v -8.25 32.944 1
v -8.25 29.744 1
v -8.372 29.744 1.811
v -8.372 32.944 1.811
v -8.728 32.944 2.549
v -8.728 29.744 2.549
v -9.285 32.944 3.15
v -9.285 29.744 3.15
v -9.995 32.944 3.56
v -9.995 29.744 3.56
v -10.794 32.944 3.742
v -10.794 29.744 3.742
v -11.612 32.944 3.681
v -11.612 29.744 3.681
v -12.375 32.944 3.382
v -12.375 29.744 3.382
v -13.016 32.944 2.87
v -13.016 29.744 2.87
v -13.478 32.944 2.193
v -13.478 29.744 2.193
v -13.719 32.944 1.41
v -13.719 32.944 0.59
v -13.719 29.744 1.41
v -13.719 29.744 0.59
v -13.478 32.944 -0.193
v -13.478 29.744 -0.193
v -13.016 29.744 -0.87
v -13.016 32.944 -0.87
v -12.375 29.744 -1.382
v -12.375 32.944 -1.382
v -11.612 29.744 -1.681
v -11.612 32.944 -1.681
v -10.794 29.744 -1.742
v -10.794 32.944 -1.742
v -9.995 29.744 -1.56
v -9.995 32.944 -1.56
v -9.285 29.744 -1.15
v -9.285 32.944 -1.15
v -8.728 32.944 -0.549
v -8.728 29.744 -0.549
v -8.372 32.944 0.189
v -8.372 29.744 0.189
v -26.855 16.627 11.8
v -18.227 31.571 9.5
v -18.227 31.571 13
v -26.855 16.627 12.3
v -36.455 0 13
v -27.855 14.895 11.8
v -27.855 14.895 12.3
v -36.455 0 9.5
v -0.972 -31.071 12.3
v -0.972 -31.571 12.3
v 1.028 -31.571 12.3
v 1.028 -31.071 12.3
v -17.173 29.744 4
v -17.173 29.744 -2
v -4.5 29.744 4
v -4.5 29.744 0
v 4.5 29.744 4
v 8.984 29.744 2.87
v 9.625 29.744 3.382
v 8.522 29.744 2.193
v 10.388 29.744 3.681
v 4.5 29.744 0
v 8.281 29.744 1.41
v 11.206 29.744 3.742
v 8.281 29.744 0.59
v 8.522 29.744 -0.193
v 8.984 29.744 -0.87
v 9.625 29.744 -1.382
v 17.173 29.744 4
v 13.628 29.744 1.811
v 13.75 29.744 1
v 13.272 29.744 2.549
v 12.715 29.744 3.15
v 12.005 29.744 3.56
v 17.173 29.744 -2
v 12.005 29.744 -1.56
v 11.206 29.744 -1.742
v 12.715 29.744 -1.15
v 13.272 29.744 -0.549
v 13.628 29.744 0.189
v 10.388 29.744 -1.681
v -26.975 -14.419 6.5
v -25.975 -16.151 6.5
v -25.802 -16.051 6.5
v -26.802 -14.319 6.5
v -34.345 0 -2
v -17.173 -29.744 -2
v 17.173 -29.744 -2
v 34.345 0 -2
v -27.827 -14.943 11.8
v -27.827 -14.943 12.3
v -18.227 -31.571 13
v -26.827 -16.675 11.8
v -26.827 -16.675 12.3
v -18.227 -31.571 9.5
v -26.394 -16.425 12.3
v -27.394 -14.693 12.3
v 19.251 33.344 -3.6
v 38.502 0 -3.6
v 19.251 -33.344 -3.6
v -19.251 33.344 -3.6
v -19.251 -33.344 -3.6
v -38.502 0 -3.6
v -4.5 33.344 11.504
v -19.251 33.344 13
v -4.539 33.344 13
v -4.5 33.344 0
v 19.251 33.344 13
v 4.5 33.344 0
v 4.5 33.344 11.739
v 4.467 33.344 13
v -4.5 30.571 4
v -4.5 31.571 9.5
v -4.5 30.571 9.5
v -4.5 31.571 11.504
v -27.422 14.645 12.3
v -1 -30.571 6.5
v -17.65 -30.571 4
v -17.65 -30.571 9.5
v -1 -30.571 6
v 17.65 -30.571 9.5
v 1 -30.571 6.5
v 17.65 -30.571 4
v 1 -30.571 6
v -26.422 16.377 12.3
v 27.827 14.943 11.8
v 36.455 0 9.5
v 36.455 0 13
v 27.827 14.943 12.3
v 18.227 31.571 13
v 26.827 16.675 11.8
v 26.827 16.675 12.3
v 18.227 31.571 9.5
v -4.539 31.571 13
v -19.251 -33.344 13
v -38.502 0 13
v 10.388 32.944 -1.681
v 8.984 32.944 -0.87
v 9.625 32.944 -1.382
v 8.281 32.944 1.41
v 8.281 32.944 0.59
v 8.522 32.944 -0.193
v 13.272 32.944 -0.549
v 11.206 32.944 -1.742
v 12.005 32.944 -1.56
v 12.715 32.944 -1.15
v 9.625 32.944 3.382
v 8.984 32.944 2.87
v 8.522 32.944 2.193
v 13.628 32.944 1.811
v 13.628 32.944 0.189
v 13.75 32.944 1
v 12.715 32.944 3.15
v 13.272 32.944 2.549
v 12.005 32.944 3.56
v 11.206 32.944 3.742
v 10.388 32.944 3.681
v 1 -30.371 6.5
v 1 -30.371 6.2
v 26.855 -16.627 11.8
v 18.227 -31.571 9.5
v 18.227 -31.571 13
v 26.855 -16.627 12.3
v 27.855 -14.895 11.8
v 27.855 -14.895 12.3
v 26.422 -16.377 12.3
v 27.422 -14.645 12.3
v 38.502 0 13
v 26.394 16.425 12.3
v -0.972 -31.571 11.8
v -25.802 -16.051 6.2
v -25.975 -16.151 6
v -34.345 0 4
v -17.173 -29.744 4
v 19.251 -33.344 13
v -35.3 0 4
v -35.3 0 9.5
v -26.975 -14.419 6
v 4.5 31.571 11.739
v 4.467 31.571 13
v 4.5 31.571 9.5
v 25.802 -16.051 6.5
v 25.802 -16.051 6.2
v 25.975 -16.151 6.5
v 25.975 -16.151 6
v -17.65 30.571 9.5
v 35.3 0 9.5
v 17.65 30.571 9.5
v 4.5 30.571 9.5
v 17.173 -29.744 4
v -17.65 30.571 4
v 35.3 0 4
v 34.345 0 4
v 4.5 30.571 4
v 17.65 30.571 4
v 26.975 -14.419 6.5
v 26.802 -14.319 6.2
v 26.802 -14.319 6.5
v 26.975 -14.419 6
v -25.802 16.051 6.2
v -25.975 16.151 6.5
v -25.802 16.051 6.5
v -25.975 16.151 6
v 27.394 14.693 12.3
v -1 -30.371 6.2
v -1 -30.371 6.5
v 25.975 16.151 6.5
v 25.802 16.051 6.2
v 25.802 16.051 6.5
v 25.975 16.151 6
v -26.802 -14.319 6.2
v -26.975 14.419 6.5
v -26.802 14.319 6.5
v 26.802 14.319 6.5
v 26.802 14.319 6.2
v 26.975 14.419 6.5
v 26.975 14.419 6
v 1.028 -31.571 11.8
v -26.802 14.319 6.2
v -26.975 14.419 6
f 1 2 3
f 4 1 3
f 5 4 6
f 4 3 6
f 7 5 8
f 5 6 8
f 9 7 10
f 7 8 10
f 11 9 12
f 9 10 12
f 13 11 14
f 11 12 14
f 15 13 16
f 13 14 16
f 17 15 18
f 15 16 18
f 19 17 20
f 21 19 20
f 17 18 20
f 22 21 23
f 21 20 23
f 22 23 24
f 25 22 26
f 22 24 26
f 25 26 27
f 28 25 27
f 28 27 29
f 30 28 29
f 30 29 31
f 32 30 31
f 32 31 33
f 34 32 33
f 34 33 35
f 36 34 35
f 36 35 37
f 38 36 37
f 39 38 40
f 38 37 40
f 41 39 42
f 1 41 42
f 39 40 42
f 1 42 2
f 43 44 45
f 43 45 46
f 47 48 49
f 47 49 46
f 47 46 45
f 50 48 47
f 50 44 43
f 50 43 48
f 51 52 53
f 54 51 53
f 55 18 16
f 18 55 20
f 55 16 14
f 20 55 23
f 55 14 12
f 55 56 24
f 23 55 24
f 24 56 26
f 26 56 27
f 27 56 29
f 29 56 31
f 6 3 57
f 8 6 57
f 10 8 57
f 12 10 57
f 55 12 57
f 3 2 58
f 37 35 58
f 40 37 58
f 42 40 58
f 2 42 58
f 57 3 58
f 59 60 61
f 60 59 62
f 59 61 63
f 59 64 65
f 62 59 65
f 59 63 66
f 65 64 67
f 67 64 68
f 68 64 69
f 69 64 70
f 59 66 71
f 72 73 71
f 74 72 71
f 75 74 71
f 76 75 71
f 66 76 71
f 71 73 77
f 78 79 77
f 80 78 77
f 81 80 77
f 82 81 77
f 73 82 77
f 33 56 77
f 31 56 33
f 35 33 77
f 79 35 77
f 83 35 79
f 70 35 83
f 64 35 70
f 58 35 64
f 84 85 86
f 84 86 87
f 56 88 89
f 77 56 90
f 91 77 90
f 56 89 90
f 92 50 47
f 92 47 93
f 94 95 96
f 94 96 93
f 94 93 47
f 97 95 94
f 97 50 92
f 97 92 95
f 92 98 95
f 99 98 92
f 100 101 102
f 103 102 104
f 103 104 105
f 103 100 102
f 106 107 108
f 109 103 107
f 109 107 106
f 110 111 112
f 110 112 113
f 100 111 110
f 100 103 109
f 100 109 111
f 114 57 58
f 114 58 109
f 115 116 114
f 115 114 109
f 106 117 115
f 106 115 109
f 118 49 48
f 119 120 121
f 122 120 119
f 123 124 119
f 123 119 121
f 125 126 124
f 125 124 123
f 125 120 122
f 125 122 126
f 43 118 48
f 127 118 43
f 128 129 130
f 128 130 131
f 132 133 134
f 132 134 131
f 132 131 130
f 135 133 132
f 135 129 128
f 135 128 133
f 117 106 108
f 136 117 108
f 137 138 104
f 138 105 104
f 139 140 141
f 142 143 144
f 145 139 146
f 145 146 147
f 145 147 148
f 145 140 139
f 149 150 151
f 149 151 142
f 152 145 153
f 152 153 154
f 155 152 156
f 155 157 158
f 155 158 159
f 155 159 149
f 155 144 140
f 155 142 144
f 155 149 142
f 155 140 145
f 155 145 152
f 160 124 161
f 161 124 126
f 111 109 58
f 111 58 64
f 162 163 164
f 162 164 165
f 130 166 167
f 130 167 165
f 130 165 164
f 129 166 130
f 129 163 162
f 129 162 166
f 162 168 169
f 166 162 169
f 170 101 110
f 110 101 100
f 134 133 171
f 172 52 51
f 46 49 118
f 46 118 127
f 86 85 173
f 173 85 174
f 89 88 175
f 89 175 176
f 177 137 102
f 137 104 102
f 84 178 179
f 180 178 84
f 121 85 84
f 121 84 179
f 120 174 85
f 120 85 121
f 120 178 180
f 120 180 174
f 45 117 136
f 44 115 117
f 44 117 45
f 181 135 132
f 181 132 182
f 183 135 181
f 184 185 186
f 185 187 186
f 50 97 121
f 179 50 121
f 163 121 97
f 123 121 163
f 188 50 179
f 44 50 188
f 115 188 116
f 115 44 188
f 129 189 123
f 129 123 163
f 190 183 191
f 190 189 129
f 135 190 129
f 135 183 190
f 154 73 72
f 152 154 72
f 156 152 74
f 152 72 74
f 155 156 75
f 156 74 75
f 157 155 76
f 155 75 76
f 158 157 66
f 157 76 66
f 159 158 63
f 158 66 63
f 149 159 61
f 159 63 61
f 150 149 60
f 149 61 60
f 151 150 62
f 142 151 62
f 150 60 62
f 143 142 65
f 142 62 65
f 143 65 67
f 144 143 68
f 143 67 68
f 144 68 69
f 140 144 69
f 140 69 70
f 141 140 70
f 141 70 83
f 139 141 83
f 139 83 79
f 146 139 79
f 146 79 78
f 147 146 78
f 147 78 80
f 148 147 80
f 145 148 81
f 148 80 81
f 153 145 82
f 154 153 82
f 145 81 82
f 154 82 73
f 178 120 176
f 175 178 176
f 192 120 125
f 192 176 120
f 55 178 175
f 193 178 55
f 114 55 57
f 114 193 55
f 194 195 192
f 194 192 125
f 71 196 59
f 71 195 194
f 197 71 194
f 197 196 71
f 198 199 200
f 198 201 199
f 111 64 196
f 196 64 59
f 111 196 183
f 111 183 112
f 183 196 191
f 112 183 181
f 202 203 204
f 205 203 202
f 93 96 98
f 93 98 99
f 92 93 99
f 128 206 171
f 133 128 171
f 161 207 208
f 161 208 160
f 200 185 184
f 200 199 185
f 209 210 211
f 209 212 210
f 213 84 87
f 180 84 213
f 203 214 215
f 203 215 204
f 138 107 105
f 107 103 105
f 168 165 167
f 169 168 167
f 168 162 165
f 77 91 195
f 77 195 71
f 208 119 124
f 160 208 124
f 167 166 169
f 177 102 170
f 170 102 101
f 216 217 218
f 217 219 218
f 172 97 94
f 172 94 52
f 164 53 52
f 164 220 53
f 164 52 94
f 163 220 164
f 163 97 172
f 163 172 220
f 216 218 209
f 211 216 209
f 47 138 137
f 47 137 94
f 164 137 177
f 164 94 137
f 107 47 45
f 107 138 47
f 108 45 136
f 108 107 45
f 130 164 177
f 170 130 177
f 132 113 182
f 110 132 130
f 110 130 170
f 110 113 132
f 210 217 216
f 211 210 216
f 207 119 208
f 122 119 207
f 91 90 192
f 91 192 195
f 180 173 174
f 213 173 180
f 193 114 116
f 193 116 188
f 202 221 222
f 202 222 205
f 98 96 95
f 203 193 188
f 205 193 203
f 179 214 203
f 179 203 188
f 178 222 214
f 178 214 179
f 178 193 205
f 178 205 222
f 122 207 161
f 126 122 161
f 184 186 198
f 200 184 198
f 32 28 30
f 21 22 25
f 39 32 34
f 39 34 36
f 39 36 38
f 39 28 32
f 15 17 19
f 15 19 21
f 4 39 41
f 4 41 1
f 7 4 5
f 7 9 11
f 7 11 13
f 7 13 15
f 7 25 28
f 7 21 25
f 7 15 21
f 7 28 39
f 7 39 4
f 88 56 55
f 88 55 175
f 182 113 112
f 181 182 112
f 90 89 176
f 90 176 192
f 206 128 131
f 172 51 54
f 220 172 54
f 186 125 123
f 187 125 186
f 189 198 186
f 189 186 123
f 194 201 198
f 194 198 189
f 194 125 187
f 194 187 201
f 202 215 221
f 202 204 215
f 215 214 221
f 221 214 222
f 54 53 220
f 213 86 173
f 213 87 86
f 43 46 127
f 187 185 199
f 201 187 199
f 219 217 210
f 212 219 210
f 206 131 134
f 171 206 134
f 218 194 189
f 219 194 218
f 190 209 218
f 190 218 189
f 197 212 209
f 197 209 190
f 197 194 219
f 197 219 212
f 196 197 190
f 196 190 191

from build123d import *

# Parameters (mm, degrees)
BOSS_EXTRUDE1_DEPTH  = 10
BOSS_EXTRUDE2_DEPTH  = 1.6
BOSS_EXTRUDE5_DEPTH  = 1.6
BOSS_EXTRUDE6_DEPTH  = 2
SKETCH10_W           = 9
SKETCH10_H           = 8
CUT_EXTRUDE1_DEPTH   = 2
BOSS_EXTRUDE7_DEPTH  = 8
CUT_EXTRUDE2_DEPTH   = 4
SKETCH13_W           = 9
SKETCH13_H           = 4
CUT_EXTRUDE3_DEPTH   = 4
SKETCH16_W           = 9
SKETCH16_H           = 2
CUT_EXTRUDE4_DEPTH   = 3
BOSS_EXTRUDE10_DEPTH = 7.6
SKETCH21_W           = 9
SKETCH21_H           = 1
CUT_EXTRUDE5_DEPTH   = 6
CUT_EXTRUDE7_DEPTH   = 2.2
BOSS_EXTRUDE11_DEPTH = 2
CUT_EXTRUDE8_DEPTH   = 2
BOSS_EXTRUDE12_DEPTH = 2
BOSS_EXTRUDE13_DEPTH = 5.7
BOSS_EXTRUDE14_DEPTH = 5
CUT_EXTRUDE9_DEPTH   = 76.043267682
SKETCH30_W           = 2
SKETCH30_H           = 0.5
BOSS_EXTRUDE15_DEPTH = 0.2
CHAMFER1_SIZE        = 0.2
SKETCH31_W           = 0.5
SKETCH31_H           = 2
BOSS_EXTRUDE16_DEPTH = 0.2
CHAMFER2_SIZE        = 0.2
SKETCH32_W           = 0.5
SKETCH32_H           = 2
BOSS_EXTRUDE17_DEPTH = 0.2
CHAMFER3_SIZE        = 0.2
SKETCH33_W           = 0.5
SKETCH33_H           = 2
BOSS_EXTRUDE18_DEPTH = 0.2
CHAMFER4_SIZE        = 0.2
BOSS_EXTRUDE25_DEPTH = 2
SKETCH34_W           = 0.5
SKETCH34_H           = 2
BOSS_EXTRUDE19_DEPTH = 0.2
CHAMFER5_SIZE        = 0.2
SKETCH41_W           = 9
SKETCH41_H           = 6
CUT_EXTRUDE10_DEPTH  = 2
SKETCH42_R           = 2.75
CUT_EXTRUDE11_DEPTH  = 3.2
SKETCH50_W           = 0.5
SKETCH50_H           = 2
BOSS_EXTRUDE27_DEPTH = 0.5
SKETCH49_W           = 0.5
SKETCH49_H           = 2
BOSS_EXTRUDE28_DEPTH = 0.5
SKETCH44_W           = 2
SKETCH44_H           = 0.5
BOSS_EXTRUDE29_DEPTH = 0.5
SKETCH45_W           = 0.5
SKETCH45_H           = 2
BOSS_EXTRUDE30_DEPTH = 0.5
SKETCH47_W           = 0.5
SKETCH47_H           = 2
BOSS_EXTRUDE31_DEPTH = 0.5
CHAMFER6_SIZE        = 0.5
CHAMFER7_SIZE        = 0.5
CHAMFER8_SIZE        = 0.5
CHAMFER9_SIZE        = 0.5
CHAMFER10_SIZE       = 0.5
CUT_EXTRUDE12_DEPTH  = 30
SKETCH53_W           = 9
SKETCH53_H           = 2
BOSS_EXTRUDE32_DEPTH = 3.6


with BuildPart() as part:
    # Sketch1 → Boss-Extrude1 (new body)
    with BuildSketch(Plane.XY):
        Polygon((37.347520861, 0), (18.673760431, 32.343901834), (-18.673760431, 32.343901834), (-37.347520861, 0), (-18.673760431, -32.343901834), (18.673760431, -32.343901834), align=None)
        Polygon((35.5, 0), (17.75, 30.743901834), (-17.75, 30.743901834), (-35.5, 0), (-17.75, -30.743901834), (17.75, -30.743901834), align=None, mode=Mode.SUBTRACT)
    extrude(amount=BOSS_EXTRUDE1_DEPTH)

    # Sketch2 → Boss-Extrude2 (add)
    with BuildSketch(Plane(origin=(0, 0, 0), x_dir=(-1, 0, 0), z_dir=(0, 0, -1))):
        Polygon((36.847520861, 0), (18.423760431, 31.910889132), (-18.423760431, 31.910889132), (-36.847520861, 0), (-18.423760431, -31.910889132), (18.423760431, -31.910889132), align=None)
    extrude(amount=BOSS_EXTRUDE2_DEPTH)

    # Sketch8 → Boss-Extrude5 (add)
    with BuildSketch(Plane(origin=(0, 0, 0), x_dir=(-1, 0, 0), z_dir=(0, 0, -1))):
        Polygon((18.673760431, -32.343901834), (37.347520861, 0), (18.673760431, 32.343901834), (-18.673760431, 32.343901834), (-37.347520861, 0), (-18.673760431, -32.343901834), align=None)
    extrude(amount=BOSS_EXTRUDE5_DEPTH)

    # Sketch9 → Boss-Extrude6 (add)
    with BuildSketch(Plane.XY):
        Polygon((-17.75, 30.743901834), (-35.5, 0), (-17.75, -30.743901834), (17.75, -30.743901834), (35.5, 0), (17.75, 30.743901834), align=None)
        Polygon((-34.345299462, 0), (-17.172649731, -29.743901834), (17.172649731, -29.743901834), (34.345299462, 0), (17.172649731, 29.743901834), (-17.172649731, 29.743901834), align=None, mode=Mode.SUBTRACT)
    extrude(amount=BOSS_EXTRUDE6_DEPTH)

    # Sketch10 → Cut-Extrude1 (cut)
    with BuildSketch(Plane.XZ.offset(-30.743901834)):
        with Locations((0, 6)):
            Rectangle(SKETCH10_W, SKETCH10_H)
    extrude(amount=-CUT_EXTRUDE1_DEPTH, mode=Mode.SUBTRACT)

    # Sketch11 → Boss-Extrude7 (add)
    with BuildSketch(Plane.XY.offset(2)):
        Polygon((35.5, 0), (17.75, 30.743901834), (-17.75, 30.743901834), (-35.5, 0), (-17.75, -30.743901834), (17.75, -30.743901834), align=None)
        Polygon((35.3, 0), (17.65, 30.570696754), (-17.65, 30.570696754), (-35.3, 0), (-17.65, -30.570696754), (17.65, -30.570696754), align=None, mode=Mode.SUBTRACT)
    extrude(amount=BOSS_EXTRUDE7_DEPTH)

    # Sketch12 → Cut-Extrude2 (cut)
    with BuildSketch(Plane.XY.offset(10)):
        Polygon((37.347520861, 0), (18.673760431, 32.343901834), (-18.673760431, 32.343901834), (-37.347520861, 0), (-18.673760431, -32.343901834), (18.673760431, -32.343901834), align=None)
    extrude(amount=-CUT_EXTRUDE2_DEPTH, mode=Mode.SUBTRACT)

    # Sketch13 → Cut-Extrude3 (cut)
    with BuildSketch(Plane(origin=(0, 30.743901834, 0), x_dir=(1, 0, 0), z_dir=(0, 1, 0))):
        with Locations((0, -4)):
            Rectangle(SKETCH13_W, SKETCH13_H)
    extrude(amount=-CUT_EXTRUDE3_DEPTH, mode=Mode.SUBTRACT)

    # Sketch16 → Cut-Extrude4 (cut)
    with BuildSketch(Plane(origin=(0, 32.343901834, 0), x_dir=(1, 0, 0), z_dir=(0, 1, 0))):
        with Locations((0, -1)):
            Rectangle(SKETCH16_W, SKETCH16_H)
    extrude(amount=-CUT_EXTRUDE4_DEPTH, mode=Mode.SUBTRACT)

    # Sketch19 → Boss-Extrude10 (add)
    with BuildSketch(Plane(origin=(0, 0, -1.6), x_dir=(-1, 0, 0), z_dir=(0, 0, -1))):
        Polygon((38.5022214, 0), (19.2511107, 33.343901834), (-19.2511107, 33.343901834), (-38.5022214, 0), (-19.2511107, -33.343901834), (19.2511107, -33.343901834), align=None)
        Polygon((-18.673760431, -32.343901834), (18.673760431, -32.343901834), (37.347520861, 0), (18.673760431, 32.343901834), (-18.673760431, 32.343901834), (-37.347520861, 0), align=None, mode=Mode.SUBTRACT)
    extrude(amount=-BOSS_EXTRUDE10_DEPTH)

    # Sketch21 → Cut-Extrude5 (cut)
    with BuildSketch(Plane.XY.offset(6)):
        with Locations((0, 32.843901834)):
            Rectangle(SKETCH21_W, SKETCH21_H)
    extrude(amount=-CUT_EXTRUDE5_DEPTH, mode=Mode.SUBTRACT)

    # Sketch22 → Cut-Extrude7 (cut)
    with BuildSketch(Plane.XY.offset(6)):
        Polygon((-36.454700538, 0), (-18.227350269, -31.570696754), (18.227350269, -31.570696754), (36.454700538, 0), (18.227350269, 31.570696754), (-18.227350269, 31.570696754), align=None)
    extrude(amount=-CUT_EXTRUDE7_DEPTH, mode=Mode.SUBTRACT)

    # Sketch24 → Boss-Extrude11 (add)
    with BuildSketch(Plane(origin=(0, 0, -1.6), x_dir=(-1, 0, 0), z_dir=(0, 0, -1))):
        Polygon((-19.2511107, -33.343901834), (19.2511107, -33.343901834), (38.5022214, 0), (19.2511107, 33.343901834), (-19.2511107, 33.343901834), (-38.5022214, 0), align=None)
    extrude(amount=BOSS_EXTRUDE11_DEPTH)

    # Sketch25 → Cut-Extrude8 (cut)
    with BuildSketch(Plane.XY):
        Polygon((-17.172649731, 29.743901834), (-34.345299462, 0), (-17.172649731, -29.743901834), (17.172649731, -29.743901834), (34.345299462, 0), (17.172649731, 29.743901834), align=None)
    extrude(amount=-CUT_EXTRUDE8_DEPTH, mode=Mode.SUBTRACT)

    # Sketch26 → Boss-Extrude12 (add)
    with BuildSketch(Plane.XY.offset(6)):
        Polygon((19.2511107, 33.343901834), (-19.2511107, 33.343901834), (-38.5022214, 0), (-19.2511107, -33.343901834), (19.2511107, -33.343901834), (38.5022214, 0), align=None)
        Polygon((18.227350269, 31.570696754), (-18.227350269, 31.570696754), (-36.454700538, 0), (-18.227350269, -31.570696754), (18.227350269, -31.570696754), (36.454700538, 0), align=None, mode=Mode.SUBTRACT)
    extrude(amount=BOSS_EXTRUDE12_DEPTH)

    # Sketch27 → Boss-Extrude13 (add)
    with BuildSketch(Plane.XY.offset(3.8)):
        Polygon((-18.227350269, 31.570696754), (-36.454700538, 0), (-18.227350269, -31.570696754), (18.227350269, -31.570696754), (36.454700538, 0), (18.227350269, 31.570696754), align=None)
        Polygon((-17.65, 30.570696754), (-35.3, 0), (-17.65, -30.570696754), (17.65, -30.570696754), (35.3, 0), (17.65, 30.570696754), align=None, mode=Mode.SUBTRACT)
    extrude(amount=BOSS_EXTRUDE13_DEPTH)

    # Sketch28 → Boss-Extrude14 (add)
    with BuildSketch(Plane.XY.offset(8)):
        Polygon((19.2511107, 33.343901834), (-19.2511107, 33.343901834), (-38.5022214, 0), (-19.2511107, -33.343901834), (19.2511107, -33.343901834), (38.5022214, 0), align=None)
        Polygon((18.227350269, 31.570696754), (-18.227350269, 31.570696754), (-36.454700538, 0), (-18.227350269, -31.570696754), (18.227350269, -31.570696754), (36.454700538, 0), align=None, mode=Mode.SUBTRACT)
    extrude(amount=BOSS_EXTRUDE14_DEPTH)

    # Sketch29 → Cut-Extrude9 (cut, through all)
    with BuildSketch(Plane(origin=(0, 29.743901834, 0), x_dir=(-1, 0, 0), z_dir=(0, -1, 0))):
        Polygon((4.5, -11.503796338), (-4.5, 0), (-4.5, -1.545129158), (-4.5, -2), (-4.5, -11.739448905), align=None)
        Polygon((4.5, -1.717056643), (4.5, 0), (-4.5, 0), (4.5, -11.503796338), (4.5, -2), align=None)
        Polygon((4.5, 0), (4.5, 2), (-4.5, 0), align=None)
        Polygon((-4.5, 0), (4.5, 2), (-4.5, 2), align=None)
    extrude(amount=-CUT_EXTRUDE9_DEPTH, mode=Mode.SUBTRACT)

    # Sketch30 → Boss-Extrude15 (add)
    with BuildSketch(Plane(origin=(0, -30.570696754, 0), x_dir=(1, 0, 0), z_dir=(0, 1, 0))):
        with Locations((0, -6.25)):
            Rectangle(SKETCH30_W, SKETCH30_H)
    extrude(amount=BOSS_EXTRUDE15_DEPTH)

    # Chamfer1
    chamfer1_edges = [part.edges().sort_by_distance(p)[0] for p in [
        (0, -30.370696754, 6),
    ]]
    chamfer(chamfer1_edges, length=CHAMFER1_SIZE - 0.0001)  # a hair under: the kernel refuses the full size

    # Sketch31 → Boss-Extrude16 (add)
    with BuildSketch(Plane(origin=(-26.475, -15.285348377, 0), x_dir=(0, 0, -1), z_dir=(0.8660254037844388, 0.49999999999999994, 0))):
        with Locations((-6.25, 0)):
            Rectangle(SKETCH31_W, SKETCH31_H)
    extrude(amount=BOSS_EXTRUDE16_DEPTH)

    # Chamfer2
    chamfer2_edges = [part.edges().sort_by_distance(p)[0] for p in [
        (-26.301794919, -15.185348377, 6),
    ]]
    chamfer(chamfer2_edges, length=CHAMFER2_SIZE - 0.0001)  # a hair under: the kernel refuses the full size

    # Sketch32 → Boss-Extrude17 (add)
    with BuildSketch(Plane(origin=(-26.475, 15.285348377, 0), x_dir=(0, 0, -1), z_dir=(0.8660254037844386, -0.5000000000000002, 0))):
        with Locations((-6.25, 0)):
            Rectangle(SKETCH32_W, SKETCH32_H)
    extrude(amount=BOSS_EXTRUDE17_DEPTH)

    # Chamfer3
    chamfer3_edges = [part.edges().sort_by_distance(p)[0] for p in [
        (-26.301794919, 15.185348377, 6),
    ]]
    chamfer(chamfer3_edges, length=CHAMFER3_SIZE - 0.0001)  # a hair under: the kernel refuses the full size

    # Sketch33 → Boss-Extrude18 (add)
    with BuildSketch(Plane(origin=(26.475, -15.285348377, 0), x_dir=(0, 0, 1), z_dir=(-0.8660254037844388, 0.49999999999999967, 0))):
        with Locations((6.25, 0)):
            Rectangle(SKETCH33_W, SKETCH33_H)
    extrude(amount=BOSS_EXTRUDE18_DEPTH)

    # Chamfer4
    chamfer4_edges = [part.edges().sort_by_distance(p)[0] for p in [
        (26.301794919, -15.185348377, 6),
    ]]
    chamfer(chamfer4_edges, length=CHAMFER4_SIZE - 0.0001)  # a hair under: the kernel refuses the full size

    # Sketch40 → Boss-Extrude25 (add)
    with BuildSketch(Plane.XY.offset(2)):
        Polygon((-17.65, 30.570696754), (-35.3, 0), (-17.65, -30.570696754), (17.65, -30.570696754), (35.3, 0), (17.65, 30.570696754), align=None)
        Polygon((-17.172649731, 29.743901834), (-34.345299462, 0), (-17.172649731, -29.743901834), (17.172649731, -29.743901834), (34.345299462, 0), (17.172649731, 29.743901834), align=None, mode=Mode.SUBTRACT)
    extrude(amount=BOSS_EXTRUDE25_DEPTH)

    # Sketch34 → Boss-Extrude19 (add)
    with BuildSketch(Plane(origin=(26.475, 15.285348377, 0), x_dir=(0, 0, 1), z_dir=(-0.8660254037844387, -0.4999999999999999, 0))):
        with Locations((6.25, 0)):
            Rectangle(SKETCH34_W, SKETCH34_H)
    extrude(amount=BOSS_EXTRUDE19_DEPTH)

    # Chamfer5
    chamfer5_edges = [part.edges().sort_by_distance(p)[0] for p in [
        (26.301794919, 15.185348377, 6),
    ]]
    chamfer(chamfer5_edges, length=CHAMFER5_SIZE - 0.0001)  # a hair under: the kernel refuses the full size

    # Sketch41 → Cut-Extrude10 (cut)
    with BuildSketch(Plane(origin=(0, 29.743901834, 0), x_dir=(-1, 0, 0), z_dir=(0, -1, 0))):
        with Locations((0, -1)):
            Rectangle(SKETCH41_W, SKETCH41_H)
    extrude(amount=-CUT_EXTRUDE10_DEPTH, mode=Mode.SUBTRACT)

    # Sketch42 → Cut-Extrude11 (cut)
    with BuildSketch(Plane(origin=(0, 29.743901834, 0), x_dir=(-1, 0, 0), z_dir=(0, -1, 0))):
        with Locations(Location((-11, -1, 0), (0, 0, 180))):
            Circle(SKETCH42_R)
        with Locations(Location((11, -1, 0), (0, 0, 180))):
            Circle(SKETCH42_R)
    extrude(amount=-CUT_EXTRUDE11_DEPTH, mode=Mode.SUBTRACT)

    # Sketch50 → Boss-Extrude27 (add)
    with BuildSketch(Plane(origin=(-27.341025404, 15.785348377, 0), x_dir=(0, 0, -1), z_dir=(0.8660254037844404, -0.49999999999999695, 0))):
        with Locations((-12.05, -0.027649731)):
            Rectangle(SKETCH50_W, SKETCH50_H)
    extrude(amount=BOSS_EXTRUDE27_DEPTH)

    # Sketch49 → Boss-Extrude28 (add)
    with BuildSketch(Plane(origin=(-27.341025404, -15.785348377, 0), x_dir=(0, 0, -1), z_dir=(0.8660254037844357, 0.5000000000000052, 0))):
        with Locations((-12.05, -0.027649731)):
            Rectangle(SKETCH49_W, SKETCH49_H)
    extrude(amount=BOSS_EXTRUDE28_DEPTH)

    # Sketch44 → Boss-Extrude29 (add)
    with BuildSketch(Plane(origin=(0, -31.570696754, 0), x_dir=(1, 0, 0), z_dir=(0, 1, 0))):
        with Locations((0.027649731, -12.05)):
            Rectangle(SKETCH44_W, SKETCH44_H)
    extrude(amount=BOSS_EXTRUDE29_DEPTH)

    # Sketch45 → Boss-Extrude30 (add)
    with BuildSketch(Plane(origin=(27.341025404, -15.785348377, 0), x_dir=(0, 0, 1), z_dir=(-0.8660254037844439, 0.49999999999999106, 0))):
        with Locations((12.05, 0.027649731)):
            Rectangle(SKETCH45_W, SKETCH45_H)
    extrude(amount=BOSS_EXTRUDE30_DEPTH)

    # Sketch47 → Boss-Extrude31 (add)
    with BuildSketch(Plane(origin=(27.341025404, 15.785348377, 0), x_dir=(0, 0, 1), z_dir=(-0.8660254037844356, -0.5000000000000054, 0))):
        with Locations((12.05, 0.027649731)):
            Rectangle(SKETCH47_W, SKETCH47_H)
    extrude(amount=BOSS_EXTRUDE31_DEPTH)

    # Chamfer6
    chamfer6_edges = [part.edges().sort_by_distance(p)[0] for p in [
        (26.894187836, 15.559293746, 11.8),
    ]]
    chamfer(chamfer6_edges, length=CHAMFER6_SIZE - 0.0001)  # a hair under: the kernel refuses the full size

    # Chamfer7
    chamfer7_edges = [part.edges().sort_by_distance(p)[0] for p in [
        (26.921837567, -15.511403008, 11.8),
    ]]
    chamfer(chamfer7_edges, length=CHAMFER7_SIZE - 0.0001)  # a hair under: the kernel refuses the full size

    # Chamfer8
    chamfer8_edges = [part.edges().sort_by_distance(p)[0] for p in [
        (0.027649731, -31.070696754, 11.8),
    ]]
    chamfer(chamfer8_edges, length=CHAMFER8_SIZE - 0.0001)  # a hair under: the kernel refuses the full size

    # Chamfer9
    chamfer9_edges = [part.edges().sort_by_distance(p)[0] for p in [
        (-26.894187836, -15.559293746, 11.8),
    ]]
    chamfer(chamfer9_edges, length=CHAMFER9_SIZE - 0.0001)  # a hair under: the kernel refuses the full size

    # Chamfer10
    chamfer10_edges = [part.edges().sort_by_distance(p)[0] for p in [
        (-26.921837567, 15.511403008, 11.8),
    ]]
    chamfer(chamfer10_edges, length=CHAMFER10_SIZE - 0.0001)  # a hair under: the kernel refuses the full size

    # Sketch52 → Cut-Extrude12 (cut)
    with BuildSketch(Plane(origin=(0, 33.343901834, 0), x_dir=(1, 0, 0), z_dir=(0, 1, 0))):
        Polygon((4.5, -11.739448905), (-4.5, -11.503796338), (-4.539176026, -13), (4.466994211, -13), align=None)
    extrude(amount=-CUT_EXTRUDE12_DEPTH, mode=Mode.SUBTRACT)

    # Sketch53 → Boss-Extrude32 (add)
    with BuildSketch(Plane(origin=(0, 33.343901834, 0), x_dir=(1, 0, 0), z_dir=(0, 1, 0))):
        with Locations((0, 1)):
            Rectangle(SKETCH53_W, SKETCH53_H)
    extrude(amount=-BOSS_EXTRUDE32_DEPTH)


solid = part.part
